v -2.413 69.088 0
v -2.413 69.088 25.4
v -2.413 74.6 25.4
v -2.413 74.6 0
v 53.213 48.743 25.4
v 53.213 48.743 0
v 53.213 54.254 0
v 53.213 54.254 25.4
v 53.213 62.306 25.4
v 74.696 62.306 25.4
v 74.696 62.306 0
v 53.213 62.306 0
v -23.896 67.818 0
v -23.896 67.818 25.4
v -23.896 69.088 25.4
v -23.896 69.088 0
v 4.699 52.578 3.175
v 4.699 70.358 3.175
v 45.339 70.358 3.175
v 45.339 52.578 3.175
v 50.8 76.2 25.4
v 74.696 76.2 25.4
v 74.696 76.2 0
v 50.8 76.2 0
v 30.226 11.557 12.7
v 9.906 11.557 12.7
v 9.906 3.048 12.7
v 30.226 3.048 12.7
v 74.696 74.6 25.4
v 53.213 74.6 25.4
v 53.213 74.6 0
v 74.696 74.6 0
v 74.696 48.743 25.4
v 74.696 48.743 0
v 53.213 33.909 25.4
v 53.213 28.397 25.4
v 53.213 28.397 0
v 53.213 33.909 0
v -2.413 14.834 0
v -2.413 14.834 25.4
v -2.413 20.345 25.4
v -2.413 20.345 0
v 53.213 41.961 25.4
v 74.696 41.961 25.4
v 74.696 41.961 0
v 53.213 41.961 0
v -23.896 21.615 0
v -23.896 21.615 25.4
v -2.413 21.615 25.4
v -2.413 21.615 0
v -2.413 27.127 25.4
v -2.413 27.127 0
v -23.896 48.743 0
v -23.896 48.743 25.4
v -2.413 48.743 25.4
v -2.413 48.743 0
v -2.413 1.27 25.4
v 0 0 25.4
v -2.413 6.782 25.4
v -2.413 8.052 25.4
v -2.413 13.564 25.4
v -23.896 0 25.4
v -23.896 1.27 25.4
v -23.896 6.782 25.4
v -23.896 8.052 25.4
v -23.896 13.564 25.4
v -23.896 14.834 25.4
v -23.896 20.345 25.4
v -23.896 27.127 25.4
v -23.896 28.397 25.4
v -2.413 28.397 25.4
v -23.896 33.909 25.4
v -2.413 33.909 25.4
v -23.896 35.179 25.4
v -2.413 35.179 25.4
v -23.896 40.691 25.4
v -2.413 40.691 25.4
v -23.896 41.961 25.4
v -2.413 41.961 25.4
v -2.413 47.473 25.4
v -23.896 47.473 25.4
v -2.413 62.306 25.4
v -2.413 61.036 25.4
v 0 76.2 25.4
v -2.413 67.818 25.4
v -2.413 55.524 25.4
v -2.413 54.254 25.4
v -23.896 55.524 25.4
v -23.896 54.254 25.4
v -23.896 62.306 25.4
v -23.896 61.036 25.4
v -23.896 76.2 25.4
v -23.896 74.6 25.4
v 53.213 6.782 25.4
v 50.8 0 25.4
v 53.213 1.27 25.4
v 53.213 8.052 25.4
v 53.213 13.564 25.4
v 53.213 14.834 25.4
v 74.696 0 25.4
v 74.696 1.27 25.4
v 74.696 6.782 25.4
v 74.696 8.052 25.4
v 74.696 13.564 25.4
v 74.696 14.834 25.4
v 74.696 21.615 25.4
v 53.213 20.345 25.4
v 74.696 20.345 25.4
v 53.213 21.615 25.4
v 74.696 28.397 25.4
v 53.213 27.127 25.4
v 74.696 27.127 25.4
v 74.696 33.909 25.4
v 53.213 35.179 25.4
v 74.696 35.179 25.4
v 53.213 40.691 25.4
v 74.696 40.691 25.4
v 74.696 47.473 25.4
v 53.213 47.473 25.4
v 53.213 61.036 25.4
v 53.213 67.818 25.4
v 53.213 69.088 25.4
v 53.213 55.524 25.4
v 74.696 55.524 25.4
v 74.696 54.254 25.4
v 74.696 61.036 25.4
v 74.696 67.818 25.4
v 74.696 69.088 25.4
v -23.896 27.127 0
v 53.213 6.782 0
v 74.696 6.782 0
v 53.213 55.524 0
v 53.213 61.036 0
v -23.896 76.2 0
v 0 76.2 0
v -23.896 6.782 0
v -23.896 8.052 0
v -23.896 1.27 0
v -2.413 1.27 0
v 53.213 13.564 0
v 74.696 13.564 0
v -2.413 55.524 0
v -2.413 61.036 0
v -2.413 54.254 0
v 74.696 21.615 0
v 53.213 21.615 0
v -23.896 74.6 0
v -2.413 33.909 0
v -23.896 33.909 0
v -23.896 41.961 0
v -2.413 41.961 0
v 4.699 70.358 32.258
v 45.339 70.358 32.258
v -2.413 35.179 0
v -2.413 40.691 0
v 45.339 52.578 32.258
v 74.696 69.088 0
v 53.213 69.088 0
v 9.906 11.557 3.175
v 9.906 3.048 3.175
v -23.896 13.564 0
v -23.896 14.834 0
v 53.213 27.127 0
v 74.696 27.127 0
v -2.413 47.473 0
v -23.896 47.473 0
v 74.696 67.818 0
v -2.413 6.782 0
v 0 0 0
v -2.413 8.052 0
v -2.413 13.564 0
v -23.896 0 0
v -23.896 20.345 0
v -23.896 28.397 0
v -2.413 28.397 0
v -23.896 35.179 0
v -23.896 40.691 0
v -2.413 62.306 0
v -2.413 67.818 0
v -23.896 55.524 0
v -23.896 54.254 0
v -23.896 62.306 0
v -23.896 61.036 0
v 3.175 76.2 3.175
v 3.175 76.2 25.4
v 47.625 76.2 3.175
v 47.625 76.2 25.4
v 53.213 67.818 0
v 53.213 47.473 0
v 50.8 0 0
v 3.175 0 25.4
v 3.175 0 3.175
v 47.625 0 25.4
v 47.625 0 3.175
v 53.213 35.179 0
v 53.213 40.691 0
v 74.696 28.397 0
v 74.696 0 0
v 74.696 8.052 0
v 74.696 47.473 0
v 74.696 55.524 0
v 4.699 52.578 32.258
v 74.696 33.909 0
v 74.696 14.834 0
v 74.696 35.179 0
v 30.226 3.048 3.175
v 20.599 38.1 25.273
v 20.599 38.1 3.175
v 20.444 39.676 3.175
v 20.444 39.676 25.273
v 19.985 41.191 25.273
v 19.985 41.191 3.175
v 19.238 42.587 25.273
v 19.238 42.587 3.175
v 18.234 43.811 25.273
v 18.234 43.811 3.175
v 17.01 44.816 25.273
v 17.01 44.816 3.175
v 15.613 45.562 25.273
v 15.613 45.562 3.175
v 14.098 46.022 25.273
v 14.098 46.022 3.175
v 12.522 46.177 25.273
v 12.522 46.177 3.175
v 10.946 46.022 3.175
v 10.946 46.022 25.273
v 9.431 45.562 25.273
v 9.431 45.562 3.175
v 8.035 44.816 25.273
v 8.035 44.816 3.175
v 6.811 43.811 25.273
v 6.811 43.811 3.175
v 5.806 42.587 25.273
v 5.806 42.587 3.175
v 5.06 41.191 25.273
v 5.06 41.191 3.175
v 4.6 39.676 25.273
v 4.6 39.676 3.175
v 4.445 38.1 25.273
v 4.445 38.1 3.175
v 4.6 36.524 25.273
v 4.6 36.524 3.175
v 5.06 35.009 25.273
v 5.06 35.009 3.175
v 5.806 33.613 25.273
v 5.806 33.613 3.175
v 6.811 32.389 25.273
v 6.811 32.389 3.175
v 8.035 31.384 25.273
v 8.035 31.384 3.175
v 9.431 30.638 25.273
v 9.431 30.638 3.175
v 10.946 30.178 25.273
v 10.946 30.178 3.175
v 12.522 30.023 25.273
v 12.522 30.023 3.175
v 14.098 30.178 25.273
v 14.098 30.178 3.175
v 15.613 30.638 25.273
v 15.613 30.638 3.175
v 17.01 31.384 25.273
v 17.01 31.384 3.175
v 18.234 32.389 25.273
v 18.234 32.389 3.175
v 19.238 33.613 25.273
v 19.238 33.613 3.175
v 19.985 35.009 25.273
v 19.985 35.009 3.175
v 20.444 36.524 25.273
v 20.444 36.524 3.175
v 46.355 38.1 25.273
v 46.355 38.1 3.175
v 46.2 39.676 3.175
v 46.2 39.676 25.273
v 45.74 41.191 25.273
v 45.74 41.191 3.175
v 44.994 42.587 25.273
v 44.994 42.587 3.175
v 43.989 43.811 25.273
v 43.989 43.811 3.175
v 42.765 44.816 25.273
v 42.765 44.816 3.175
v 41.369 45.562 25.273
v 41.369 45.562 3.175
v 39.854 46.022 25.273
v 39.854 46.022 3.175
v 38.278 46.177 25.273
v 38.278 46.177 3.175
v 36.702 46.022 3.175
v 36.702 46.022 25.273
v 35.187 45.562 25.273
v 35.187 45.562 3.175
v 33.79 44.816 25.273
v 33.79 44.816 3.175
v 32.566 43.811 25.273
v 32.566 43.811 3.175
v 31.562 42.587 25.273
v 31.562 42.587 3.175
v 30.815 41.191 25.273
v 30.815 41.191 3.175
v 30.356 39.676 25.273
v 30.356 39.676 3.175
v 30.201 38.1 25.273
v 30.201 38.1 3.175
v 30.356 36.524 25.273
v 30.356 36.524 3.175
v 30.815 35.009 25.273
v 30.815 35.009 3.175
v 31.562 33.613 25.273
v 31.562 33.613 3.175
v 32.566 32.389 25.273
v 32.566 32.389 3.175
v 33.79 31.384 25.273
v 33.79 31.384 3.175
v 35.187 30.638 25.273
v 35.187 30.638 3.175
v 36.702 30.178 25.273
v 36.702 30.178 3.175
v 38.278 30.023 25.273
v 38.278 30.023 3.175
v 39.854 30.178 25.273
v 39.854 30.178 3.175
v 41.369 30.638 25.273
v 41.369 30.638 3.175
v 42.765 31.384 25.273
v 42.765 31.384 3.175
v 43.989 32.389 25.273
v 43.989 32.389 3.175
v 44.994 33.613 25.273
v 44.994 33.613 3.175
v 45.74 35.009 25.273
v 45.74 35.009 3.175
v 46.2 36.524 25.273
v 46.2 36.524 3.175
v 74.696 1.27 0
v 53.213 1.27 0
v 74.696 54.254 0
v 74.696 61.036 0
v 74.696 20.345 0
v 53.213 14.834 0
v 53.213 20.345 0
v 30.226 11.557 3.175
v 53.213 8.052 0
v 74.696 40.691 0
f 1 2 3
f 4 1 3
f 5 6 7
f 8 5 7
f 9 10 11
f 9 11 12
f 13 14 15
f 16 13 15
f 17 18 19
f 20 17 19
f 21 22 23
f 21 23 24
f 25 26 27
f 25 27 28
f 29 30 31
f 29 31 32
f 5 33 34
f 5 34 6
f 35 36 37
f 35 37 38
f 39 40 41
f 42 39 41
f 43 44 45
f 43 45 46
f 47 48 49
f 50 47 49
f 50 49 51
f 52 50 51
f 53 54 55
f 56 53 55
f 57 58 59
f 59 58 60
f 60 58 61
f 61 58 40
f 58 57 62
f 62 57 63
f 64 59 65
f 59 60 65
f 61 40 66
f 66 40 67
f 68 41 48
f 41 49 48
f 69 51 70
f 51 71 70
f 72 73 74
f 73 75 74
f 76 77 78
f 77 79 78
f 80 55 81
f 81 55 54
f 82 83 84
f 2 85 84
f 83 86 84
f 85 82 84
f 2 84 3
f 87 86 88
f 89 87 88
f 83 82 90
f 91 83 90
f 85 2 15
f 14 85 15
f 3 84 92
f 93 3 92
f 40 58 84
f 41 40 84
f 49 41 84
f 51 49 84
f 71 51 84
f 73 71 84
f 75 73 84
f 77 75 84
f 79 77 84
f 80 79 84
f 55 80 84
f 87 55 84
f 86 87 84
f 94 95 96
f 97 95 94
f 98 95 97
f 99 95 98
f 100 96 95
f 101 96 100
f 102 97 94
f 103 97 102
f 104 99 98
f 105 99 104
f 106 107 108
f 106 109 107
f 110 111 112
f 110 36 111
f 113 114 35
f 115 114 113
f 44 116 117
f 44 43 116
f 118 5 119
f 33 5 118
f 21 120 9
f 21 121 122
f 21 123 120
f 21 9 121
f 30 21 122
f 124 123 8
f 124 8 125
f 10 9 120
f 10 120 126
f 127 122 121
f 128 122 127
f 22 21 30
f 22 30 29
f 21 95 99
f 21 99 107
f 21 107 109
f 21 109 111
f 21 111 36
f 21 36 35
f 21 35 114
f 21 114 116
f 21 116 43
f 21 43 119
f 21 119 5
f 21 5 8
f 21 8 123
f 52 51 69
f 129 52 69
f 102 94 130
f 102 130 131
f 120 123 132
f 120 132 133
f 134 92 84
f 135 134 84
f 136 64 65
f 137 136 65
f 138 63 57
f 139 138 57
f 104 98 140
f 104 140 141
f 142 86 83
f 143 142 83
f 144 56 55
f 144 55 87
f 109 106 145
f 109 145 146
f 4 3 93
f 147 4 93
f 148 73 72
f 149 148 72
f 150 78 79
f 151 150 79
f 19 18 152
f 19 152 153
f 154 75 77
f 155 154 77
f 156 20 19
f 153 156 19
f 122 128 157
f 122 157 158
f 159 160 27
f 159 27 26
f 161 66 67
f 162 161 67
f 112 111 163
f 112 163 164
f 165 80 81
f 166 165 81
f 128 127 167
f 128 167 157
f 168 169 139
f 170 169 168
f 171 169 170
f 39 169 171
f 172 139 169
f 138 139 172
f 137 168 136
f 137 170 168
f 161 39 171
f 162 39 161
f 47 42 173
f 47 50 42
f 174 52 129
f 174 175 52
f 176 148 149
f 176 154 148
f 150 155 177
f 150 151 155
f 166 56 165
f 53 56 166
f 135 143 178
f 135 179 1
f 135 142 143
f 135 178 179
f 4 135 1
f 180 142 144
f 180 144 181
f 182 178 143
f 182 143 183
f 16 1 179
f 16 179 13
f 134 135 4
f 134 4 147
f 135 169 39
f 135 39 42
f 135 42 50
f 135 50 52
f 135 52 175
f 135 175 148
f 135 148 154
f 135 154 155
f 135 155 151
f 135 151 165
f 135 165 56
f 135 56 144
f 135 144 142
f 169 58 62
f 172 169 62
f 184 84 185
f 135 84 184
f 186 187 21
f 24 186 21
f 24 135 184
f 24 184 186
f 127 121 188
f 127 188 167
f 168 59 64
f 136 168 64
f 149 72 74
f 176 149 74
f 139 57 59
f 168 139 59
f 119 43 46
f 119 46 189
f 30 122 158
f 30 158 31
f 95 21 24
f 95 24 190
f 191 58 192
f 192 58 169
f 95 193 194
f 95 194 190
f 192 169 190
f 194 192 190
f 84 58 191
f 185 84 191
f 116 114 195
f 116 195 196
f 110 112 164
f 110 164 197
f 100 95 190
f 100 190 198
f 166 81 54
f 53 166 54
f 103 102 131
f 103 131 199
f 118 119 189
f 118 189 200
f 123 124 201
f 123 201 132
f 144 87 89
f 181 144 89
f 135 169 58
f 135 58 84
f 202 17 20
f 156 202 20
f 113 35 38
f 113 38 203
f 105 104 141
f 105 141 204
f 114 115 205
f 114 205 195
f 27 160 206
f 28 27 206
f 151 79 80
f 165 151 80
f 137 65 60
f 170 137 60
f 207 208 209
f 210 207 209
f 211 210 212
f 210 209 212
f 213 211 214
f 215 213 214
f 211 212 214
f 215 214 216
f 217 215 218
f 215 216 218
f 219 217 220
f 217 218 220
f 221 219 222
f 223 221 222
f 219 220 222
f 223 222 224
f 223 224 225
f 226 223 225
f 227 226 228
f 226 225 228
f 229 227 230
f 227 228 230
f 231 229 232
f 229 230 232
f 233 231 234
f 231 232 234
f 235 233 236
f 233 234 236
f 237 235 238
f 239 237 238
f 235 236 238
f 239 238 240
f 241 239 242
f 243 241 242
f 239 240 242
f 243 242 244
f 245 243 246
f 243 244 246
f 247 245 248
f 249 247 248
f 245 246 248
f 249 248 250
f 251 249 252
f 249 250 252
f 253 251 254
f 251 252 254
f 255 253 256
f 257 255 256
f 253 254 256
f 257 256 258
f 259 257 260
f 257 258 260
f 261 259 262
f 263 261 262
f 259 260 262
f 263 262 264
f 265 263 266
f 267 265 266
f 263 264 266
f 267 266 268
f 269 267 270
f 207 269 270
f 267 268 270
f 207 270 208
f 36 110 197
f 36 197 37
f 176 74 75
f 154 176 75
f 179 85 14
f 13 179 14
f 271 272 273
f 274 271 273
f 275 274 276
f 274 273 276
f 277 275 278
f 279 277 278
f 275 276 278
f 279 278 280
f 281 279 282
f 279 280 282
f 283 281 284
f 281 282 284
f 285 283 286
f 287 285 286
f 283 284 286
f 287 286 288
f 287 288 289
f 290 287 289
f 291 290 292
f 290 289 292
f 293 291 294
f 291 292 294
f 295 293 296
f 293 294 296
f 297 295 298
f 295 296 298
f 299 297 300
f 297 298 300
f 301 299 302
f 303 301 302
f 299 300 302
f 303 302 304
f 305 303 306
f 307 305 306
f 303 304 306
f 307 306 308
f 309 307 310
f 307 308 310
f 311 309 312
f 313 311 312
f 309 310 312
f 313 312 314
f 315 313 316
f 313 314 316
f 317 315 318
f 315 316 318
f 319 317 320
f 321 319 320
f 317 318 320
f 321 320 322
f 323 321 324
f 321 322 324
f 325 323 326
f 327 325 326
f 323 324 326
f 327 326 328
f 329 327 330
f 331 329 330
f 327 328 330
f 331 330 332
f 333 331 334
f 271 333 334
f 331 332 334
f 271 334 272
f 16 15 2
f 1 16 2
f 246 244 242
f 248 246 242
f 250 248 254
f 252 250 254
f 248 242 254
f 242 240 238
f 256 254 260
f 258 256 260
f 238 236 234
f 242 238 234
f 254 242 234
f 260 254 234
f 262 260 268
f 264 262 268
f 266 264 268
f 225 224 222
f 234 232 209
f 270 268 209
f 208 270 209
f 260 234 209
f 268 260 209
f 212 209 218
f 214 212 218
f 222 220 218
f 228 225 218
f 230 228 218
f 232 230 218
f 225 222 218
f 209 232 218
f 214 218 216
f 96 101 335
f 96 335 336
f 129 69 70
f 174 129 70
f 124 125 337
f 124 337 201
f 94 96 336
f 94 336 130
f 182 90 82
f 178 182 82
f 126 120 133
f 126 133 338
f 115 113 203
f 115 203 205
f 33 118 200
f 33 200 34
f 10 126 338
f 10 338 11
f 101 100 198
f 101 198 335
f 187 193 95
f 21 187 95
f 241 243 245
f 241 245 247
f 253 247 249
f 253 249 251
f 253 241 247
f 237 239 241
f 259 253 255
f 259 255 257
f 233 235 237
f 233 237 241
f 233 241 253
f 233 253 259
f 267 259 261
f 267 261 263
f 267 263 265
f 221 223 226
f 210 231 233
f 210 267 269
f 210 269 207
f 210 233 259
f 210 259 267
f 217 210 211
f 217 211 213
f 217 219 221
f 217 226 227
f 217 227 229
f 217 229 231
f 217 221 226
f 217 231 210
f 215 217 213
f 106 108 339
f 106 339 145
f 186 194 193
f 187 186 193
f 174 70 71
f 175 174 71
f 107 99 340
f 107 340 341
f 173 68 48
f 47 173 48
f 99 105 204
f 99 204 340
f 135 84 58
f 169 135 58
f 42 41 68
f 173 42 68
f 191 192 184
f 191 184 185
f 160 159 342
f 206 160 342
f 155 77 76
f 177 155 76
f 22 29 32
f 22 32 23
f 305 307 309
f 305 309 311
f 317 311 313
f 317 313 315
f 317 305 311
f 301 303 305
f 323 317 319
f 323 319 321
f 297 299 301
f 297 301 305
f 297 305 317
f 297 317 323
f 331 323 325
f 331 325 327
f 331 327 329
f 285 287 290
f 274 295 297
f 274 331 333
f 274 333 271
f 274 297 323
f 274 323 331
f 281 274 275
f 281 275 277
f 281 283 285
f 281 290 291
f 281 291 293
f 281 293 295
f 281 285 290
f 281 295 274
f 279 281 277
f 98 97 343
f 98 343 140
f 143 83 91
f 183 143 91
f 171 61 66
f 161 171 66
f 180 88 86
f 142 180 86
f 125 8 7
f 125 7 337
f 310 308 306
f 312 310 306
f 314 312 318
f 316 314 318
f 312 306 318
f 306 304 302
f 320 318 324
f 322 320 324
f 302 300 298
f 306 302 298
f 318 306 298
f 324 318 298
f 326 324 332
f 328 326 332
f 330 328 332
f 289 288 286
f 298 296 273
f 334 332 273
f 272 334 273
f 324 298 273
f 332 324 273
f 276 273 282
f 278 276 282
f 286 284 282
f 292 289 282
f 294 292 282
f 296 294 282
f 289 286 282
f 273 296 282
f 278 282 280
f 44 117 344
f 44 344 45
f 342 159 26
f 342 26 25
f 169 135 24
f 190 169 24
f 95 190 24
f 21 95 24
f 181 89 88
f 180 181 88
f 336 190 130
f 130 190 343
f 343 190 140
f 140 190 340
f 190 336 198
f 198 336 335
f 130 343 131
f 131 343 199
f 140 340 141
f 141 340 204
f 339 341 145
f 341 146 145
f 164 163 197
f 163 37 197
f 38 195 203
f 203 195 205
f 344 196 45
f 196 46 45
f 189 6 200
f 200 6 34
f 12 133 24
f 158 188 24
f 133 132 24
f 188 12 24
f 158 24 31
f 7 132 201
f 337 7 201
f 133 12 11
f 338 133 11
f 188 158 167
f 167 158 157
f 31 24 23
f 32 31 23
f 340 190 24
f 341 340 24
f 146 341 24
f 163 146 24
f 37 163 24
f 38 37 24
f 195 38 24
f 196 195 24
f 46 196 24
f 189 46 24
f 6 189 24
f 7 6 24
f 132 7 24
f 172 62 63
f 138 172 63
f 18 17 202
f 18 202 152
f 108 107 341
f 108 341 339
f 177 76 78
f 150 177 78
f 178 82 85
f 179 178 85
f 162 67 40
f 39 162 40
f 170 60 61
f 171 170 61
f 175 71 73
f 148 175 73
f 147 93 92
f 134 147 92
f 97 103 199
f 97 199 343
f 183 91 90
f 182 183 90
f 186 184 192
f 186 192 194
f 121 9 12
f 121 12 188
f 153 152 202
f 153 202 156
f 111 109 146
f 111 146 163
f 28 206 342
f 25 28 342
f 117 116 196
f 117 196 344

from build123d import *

# Parameters (mm, degrees)
F0_W      = 50.8
F0_H      = 76.2
F1_DEPTH  = 25.4
F2_W      = 44.45
F2_H      = 37.52266
F3_DEPTH  = 76.201
F5_DEPTH  = 25.4
F8_R      = 8.0772
F9_DEPTH  = 22.098
F10_W     = 20.32
F10_H     = 8.509
F11_DEPTH = 9.525
F12_W     = 40.64
F12_H     = 17.78
F13_DEPTH = 29.083


with BuildPart() as f1:
    # F0 (on Top) → F1 (new body)
    with BuildSketch(Plane.XY):
        with Locations((25.4, 38.1)):
            Rectangle(F0_W, F0_H)
    extrude(amount=F1_DEPTH)

    # F2 (on face) → F3 (cut, through all)
    with BuildSketch(Plane.XZ):
        with Locations((25.4, 21.93633)):
            Rectangle(F2_W, F2_H)
    extrude(amount=-F3_DEPTH, mode=Mode.SUBTRACT)


with BuildPart() as f5:
    # F4 (on face) → F5 (new body, through all)
    with BuildSketch(Plane.XY.offset(25.4)):
        Polygon((74.696429, 76.2), (50.8, 76.2), (50.8, 0), (74.696429, 0), (74.696429, 1.27), (53.213, 1.27), (53.213, 6.7818), (74.696429, 6.7818), (74.696429, 8.0518), (53.213, 8.0518), (53.213, 13.5636), (74.696429, 13.5636), (74.696429, 14.8336), (53.213, 14.8336), (53.213, 20.3454), (74.696429, 20.3454), (74.696429, 21.6154), (53.213, 21.6154), (53.213, 27.1272), (74.696429, 27.1272), (74.696429, 28.3972), (53.213, 28.3972), (53.213, 33.909), (74.696429, 33.909), (74.696429, 35.179), (53.213, 35.179), (53.213, 40.6908), (74.696429, 40.6908), (74.696429, 41.9608), (53.213, 41.9608), (53.213, 47.4726), (74.696429, 47.4726), (74.696429, 48.7426), (53.213, 48.7426), (53.213, 54.2544), (74.696429, 54.2544), (74.696429, 55.5244), (53.213, 55.5244), (53.213, 61.0362), (74.696429, 61.0362), (74.696429, 62.3062), (53.213, 62.3062), (53.213, 67.818), (74.696429, 67.818), (74.696429, 69.088), (53.213, 69.088), (53.213, 74.5998), (74.696429, 74.5998), align=None)
    extrude(amount=-F5_DEPTH)


with BuildPart() as f7_1:
    # F7: instance of F5
    add(f5.part.mirror(Plane.YZ.offset(25.4)))


with BuildPart() as f9:
    # F8 (on face) → F9 (new body)
    with BuildSketch(Plane.XY.offset(3.175)):
        with Locations((12.5222, 38.1)):
            Circle(F8_R)
        with Locations((38.2778, 38.1)):
            Circle(F8_R)
    extrude(amount=F9_DEPTH)


with BuildPart() as f11:
    # F10 (on face) → F11 (new body)
    with BuildSketch(Plane.XY.offset(3.175)):
        with Locations((20.066, 7.3025)):
            Rectangle(F10_W, F10_H)
    extrude(amount=F11_DEPTH)


with BuildPart() as f13:
    # F12 (on face) → F13 (new body)
    with BuildSketch(Plane.XY.offset(3.175)):
        with Locations((25.019, 61.468)):
            Rectangle(F12_W, F12_H)
    extrude(amount=F13_DEPTH)


solid = Compound([f1.part, f5.part, f7_1.part, f9.part, f11.part, f13.part])
